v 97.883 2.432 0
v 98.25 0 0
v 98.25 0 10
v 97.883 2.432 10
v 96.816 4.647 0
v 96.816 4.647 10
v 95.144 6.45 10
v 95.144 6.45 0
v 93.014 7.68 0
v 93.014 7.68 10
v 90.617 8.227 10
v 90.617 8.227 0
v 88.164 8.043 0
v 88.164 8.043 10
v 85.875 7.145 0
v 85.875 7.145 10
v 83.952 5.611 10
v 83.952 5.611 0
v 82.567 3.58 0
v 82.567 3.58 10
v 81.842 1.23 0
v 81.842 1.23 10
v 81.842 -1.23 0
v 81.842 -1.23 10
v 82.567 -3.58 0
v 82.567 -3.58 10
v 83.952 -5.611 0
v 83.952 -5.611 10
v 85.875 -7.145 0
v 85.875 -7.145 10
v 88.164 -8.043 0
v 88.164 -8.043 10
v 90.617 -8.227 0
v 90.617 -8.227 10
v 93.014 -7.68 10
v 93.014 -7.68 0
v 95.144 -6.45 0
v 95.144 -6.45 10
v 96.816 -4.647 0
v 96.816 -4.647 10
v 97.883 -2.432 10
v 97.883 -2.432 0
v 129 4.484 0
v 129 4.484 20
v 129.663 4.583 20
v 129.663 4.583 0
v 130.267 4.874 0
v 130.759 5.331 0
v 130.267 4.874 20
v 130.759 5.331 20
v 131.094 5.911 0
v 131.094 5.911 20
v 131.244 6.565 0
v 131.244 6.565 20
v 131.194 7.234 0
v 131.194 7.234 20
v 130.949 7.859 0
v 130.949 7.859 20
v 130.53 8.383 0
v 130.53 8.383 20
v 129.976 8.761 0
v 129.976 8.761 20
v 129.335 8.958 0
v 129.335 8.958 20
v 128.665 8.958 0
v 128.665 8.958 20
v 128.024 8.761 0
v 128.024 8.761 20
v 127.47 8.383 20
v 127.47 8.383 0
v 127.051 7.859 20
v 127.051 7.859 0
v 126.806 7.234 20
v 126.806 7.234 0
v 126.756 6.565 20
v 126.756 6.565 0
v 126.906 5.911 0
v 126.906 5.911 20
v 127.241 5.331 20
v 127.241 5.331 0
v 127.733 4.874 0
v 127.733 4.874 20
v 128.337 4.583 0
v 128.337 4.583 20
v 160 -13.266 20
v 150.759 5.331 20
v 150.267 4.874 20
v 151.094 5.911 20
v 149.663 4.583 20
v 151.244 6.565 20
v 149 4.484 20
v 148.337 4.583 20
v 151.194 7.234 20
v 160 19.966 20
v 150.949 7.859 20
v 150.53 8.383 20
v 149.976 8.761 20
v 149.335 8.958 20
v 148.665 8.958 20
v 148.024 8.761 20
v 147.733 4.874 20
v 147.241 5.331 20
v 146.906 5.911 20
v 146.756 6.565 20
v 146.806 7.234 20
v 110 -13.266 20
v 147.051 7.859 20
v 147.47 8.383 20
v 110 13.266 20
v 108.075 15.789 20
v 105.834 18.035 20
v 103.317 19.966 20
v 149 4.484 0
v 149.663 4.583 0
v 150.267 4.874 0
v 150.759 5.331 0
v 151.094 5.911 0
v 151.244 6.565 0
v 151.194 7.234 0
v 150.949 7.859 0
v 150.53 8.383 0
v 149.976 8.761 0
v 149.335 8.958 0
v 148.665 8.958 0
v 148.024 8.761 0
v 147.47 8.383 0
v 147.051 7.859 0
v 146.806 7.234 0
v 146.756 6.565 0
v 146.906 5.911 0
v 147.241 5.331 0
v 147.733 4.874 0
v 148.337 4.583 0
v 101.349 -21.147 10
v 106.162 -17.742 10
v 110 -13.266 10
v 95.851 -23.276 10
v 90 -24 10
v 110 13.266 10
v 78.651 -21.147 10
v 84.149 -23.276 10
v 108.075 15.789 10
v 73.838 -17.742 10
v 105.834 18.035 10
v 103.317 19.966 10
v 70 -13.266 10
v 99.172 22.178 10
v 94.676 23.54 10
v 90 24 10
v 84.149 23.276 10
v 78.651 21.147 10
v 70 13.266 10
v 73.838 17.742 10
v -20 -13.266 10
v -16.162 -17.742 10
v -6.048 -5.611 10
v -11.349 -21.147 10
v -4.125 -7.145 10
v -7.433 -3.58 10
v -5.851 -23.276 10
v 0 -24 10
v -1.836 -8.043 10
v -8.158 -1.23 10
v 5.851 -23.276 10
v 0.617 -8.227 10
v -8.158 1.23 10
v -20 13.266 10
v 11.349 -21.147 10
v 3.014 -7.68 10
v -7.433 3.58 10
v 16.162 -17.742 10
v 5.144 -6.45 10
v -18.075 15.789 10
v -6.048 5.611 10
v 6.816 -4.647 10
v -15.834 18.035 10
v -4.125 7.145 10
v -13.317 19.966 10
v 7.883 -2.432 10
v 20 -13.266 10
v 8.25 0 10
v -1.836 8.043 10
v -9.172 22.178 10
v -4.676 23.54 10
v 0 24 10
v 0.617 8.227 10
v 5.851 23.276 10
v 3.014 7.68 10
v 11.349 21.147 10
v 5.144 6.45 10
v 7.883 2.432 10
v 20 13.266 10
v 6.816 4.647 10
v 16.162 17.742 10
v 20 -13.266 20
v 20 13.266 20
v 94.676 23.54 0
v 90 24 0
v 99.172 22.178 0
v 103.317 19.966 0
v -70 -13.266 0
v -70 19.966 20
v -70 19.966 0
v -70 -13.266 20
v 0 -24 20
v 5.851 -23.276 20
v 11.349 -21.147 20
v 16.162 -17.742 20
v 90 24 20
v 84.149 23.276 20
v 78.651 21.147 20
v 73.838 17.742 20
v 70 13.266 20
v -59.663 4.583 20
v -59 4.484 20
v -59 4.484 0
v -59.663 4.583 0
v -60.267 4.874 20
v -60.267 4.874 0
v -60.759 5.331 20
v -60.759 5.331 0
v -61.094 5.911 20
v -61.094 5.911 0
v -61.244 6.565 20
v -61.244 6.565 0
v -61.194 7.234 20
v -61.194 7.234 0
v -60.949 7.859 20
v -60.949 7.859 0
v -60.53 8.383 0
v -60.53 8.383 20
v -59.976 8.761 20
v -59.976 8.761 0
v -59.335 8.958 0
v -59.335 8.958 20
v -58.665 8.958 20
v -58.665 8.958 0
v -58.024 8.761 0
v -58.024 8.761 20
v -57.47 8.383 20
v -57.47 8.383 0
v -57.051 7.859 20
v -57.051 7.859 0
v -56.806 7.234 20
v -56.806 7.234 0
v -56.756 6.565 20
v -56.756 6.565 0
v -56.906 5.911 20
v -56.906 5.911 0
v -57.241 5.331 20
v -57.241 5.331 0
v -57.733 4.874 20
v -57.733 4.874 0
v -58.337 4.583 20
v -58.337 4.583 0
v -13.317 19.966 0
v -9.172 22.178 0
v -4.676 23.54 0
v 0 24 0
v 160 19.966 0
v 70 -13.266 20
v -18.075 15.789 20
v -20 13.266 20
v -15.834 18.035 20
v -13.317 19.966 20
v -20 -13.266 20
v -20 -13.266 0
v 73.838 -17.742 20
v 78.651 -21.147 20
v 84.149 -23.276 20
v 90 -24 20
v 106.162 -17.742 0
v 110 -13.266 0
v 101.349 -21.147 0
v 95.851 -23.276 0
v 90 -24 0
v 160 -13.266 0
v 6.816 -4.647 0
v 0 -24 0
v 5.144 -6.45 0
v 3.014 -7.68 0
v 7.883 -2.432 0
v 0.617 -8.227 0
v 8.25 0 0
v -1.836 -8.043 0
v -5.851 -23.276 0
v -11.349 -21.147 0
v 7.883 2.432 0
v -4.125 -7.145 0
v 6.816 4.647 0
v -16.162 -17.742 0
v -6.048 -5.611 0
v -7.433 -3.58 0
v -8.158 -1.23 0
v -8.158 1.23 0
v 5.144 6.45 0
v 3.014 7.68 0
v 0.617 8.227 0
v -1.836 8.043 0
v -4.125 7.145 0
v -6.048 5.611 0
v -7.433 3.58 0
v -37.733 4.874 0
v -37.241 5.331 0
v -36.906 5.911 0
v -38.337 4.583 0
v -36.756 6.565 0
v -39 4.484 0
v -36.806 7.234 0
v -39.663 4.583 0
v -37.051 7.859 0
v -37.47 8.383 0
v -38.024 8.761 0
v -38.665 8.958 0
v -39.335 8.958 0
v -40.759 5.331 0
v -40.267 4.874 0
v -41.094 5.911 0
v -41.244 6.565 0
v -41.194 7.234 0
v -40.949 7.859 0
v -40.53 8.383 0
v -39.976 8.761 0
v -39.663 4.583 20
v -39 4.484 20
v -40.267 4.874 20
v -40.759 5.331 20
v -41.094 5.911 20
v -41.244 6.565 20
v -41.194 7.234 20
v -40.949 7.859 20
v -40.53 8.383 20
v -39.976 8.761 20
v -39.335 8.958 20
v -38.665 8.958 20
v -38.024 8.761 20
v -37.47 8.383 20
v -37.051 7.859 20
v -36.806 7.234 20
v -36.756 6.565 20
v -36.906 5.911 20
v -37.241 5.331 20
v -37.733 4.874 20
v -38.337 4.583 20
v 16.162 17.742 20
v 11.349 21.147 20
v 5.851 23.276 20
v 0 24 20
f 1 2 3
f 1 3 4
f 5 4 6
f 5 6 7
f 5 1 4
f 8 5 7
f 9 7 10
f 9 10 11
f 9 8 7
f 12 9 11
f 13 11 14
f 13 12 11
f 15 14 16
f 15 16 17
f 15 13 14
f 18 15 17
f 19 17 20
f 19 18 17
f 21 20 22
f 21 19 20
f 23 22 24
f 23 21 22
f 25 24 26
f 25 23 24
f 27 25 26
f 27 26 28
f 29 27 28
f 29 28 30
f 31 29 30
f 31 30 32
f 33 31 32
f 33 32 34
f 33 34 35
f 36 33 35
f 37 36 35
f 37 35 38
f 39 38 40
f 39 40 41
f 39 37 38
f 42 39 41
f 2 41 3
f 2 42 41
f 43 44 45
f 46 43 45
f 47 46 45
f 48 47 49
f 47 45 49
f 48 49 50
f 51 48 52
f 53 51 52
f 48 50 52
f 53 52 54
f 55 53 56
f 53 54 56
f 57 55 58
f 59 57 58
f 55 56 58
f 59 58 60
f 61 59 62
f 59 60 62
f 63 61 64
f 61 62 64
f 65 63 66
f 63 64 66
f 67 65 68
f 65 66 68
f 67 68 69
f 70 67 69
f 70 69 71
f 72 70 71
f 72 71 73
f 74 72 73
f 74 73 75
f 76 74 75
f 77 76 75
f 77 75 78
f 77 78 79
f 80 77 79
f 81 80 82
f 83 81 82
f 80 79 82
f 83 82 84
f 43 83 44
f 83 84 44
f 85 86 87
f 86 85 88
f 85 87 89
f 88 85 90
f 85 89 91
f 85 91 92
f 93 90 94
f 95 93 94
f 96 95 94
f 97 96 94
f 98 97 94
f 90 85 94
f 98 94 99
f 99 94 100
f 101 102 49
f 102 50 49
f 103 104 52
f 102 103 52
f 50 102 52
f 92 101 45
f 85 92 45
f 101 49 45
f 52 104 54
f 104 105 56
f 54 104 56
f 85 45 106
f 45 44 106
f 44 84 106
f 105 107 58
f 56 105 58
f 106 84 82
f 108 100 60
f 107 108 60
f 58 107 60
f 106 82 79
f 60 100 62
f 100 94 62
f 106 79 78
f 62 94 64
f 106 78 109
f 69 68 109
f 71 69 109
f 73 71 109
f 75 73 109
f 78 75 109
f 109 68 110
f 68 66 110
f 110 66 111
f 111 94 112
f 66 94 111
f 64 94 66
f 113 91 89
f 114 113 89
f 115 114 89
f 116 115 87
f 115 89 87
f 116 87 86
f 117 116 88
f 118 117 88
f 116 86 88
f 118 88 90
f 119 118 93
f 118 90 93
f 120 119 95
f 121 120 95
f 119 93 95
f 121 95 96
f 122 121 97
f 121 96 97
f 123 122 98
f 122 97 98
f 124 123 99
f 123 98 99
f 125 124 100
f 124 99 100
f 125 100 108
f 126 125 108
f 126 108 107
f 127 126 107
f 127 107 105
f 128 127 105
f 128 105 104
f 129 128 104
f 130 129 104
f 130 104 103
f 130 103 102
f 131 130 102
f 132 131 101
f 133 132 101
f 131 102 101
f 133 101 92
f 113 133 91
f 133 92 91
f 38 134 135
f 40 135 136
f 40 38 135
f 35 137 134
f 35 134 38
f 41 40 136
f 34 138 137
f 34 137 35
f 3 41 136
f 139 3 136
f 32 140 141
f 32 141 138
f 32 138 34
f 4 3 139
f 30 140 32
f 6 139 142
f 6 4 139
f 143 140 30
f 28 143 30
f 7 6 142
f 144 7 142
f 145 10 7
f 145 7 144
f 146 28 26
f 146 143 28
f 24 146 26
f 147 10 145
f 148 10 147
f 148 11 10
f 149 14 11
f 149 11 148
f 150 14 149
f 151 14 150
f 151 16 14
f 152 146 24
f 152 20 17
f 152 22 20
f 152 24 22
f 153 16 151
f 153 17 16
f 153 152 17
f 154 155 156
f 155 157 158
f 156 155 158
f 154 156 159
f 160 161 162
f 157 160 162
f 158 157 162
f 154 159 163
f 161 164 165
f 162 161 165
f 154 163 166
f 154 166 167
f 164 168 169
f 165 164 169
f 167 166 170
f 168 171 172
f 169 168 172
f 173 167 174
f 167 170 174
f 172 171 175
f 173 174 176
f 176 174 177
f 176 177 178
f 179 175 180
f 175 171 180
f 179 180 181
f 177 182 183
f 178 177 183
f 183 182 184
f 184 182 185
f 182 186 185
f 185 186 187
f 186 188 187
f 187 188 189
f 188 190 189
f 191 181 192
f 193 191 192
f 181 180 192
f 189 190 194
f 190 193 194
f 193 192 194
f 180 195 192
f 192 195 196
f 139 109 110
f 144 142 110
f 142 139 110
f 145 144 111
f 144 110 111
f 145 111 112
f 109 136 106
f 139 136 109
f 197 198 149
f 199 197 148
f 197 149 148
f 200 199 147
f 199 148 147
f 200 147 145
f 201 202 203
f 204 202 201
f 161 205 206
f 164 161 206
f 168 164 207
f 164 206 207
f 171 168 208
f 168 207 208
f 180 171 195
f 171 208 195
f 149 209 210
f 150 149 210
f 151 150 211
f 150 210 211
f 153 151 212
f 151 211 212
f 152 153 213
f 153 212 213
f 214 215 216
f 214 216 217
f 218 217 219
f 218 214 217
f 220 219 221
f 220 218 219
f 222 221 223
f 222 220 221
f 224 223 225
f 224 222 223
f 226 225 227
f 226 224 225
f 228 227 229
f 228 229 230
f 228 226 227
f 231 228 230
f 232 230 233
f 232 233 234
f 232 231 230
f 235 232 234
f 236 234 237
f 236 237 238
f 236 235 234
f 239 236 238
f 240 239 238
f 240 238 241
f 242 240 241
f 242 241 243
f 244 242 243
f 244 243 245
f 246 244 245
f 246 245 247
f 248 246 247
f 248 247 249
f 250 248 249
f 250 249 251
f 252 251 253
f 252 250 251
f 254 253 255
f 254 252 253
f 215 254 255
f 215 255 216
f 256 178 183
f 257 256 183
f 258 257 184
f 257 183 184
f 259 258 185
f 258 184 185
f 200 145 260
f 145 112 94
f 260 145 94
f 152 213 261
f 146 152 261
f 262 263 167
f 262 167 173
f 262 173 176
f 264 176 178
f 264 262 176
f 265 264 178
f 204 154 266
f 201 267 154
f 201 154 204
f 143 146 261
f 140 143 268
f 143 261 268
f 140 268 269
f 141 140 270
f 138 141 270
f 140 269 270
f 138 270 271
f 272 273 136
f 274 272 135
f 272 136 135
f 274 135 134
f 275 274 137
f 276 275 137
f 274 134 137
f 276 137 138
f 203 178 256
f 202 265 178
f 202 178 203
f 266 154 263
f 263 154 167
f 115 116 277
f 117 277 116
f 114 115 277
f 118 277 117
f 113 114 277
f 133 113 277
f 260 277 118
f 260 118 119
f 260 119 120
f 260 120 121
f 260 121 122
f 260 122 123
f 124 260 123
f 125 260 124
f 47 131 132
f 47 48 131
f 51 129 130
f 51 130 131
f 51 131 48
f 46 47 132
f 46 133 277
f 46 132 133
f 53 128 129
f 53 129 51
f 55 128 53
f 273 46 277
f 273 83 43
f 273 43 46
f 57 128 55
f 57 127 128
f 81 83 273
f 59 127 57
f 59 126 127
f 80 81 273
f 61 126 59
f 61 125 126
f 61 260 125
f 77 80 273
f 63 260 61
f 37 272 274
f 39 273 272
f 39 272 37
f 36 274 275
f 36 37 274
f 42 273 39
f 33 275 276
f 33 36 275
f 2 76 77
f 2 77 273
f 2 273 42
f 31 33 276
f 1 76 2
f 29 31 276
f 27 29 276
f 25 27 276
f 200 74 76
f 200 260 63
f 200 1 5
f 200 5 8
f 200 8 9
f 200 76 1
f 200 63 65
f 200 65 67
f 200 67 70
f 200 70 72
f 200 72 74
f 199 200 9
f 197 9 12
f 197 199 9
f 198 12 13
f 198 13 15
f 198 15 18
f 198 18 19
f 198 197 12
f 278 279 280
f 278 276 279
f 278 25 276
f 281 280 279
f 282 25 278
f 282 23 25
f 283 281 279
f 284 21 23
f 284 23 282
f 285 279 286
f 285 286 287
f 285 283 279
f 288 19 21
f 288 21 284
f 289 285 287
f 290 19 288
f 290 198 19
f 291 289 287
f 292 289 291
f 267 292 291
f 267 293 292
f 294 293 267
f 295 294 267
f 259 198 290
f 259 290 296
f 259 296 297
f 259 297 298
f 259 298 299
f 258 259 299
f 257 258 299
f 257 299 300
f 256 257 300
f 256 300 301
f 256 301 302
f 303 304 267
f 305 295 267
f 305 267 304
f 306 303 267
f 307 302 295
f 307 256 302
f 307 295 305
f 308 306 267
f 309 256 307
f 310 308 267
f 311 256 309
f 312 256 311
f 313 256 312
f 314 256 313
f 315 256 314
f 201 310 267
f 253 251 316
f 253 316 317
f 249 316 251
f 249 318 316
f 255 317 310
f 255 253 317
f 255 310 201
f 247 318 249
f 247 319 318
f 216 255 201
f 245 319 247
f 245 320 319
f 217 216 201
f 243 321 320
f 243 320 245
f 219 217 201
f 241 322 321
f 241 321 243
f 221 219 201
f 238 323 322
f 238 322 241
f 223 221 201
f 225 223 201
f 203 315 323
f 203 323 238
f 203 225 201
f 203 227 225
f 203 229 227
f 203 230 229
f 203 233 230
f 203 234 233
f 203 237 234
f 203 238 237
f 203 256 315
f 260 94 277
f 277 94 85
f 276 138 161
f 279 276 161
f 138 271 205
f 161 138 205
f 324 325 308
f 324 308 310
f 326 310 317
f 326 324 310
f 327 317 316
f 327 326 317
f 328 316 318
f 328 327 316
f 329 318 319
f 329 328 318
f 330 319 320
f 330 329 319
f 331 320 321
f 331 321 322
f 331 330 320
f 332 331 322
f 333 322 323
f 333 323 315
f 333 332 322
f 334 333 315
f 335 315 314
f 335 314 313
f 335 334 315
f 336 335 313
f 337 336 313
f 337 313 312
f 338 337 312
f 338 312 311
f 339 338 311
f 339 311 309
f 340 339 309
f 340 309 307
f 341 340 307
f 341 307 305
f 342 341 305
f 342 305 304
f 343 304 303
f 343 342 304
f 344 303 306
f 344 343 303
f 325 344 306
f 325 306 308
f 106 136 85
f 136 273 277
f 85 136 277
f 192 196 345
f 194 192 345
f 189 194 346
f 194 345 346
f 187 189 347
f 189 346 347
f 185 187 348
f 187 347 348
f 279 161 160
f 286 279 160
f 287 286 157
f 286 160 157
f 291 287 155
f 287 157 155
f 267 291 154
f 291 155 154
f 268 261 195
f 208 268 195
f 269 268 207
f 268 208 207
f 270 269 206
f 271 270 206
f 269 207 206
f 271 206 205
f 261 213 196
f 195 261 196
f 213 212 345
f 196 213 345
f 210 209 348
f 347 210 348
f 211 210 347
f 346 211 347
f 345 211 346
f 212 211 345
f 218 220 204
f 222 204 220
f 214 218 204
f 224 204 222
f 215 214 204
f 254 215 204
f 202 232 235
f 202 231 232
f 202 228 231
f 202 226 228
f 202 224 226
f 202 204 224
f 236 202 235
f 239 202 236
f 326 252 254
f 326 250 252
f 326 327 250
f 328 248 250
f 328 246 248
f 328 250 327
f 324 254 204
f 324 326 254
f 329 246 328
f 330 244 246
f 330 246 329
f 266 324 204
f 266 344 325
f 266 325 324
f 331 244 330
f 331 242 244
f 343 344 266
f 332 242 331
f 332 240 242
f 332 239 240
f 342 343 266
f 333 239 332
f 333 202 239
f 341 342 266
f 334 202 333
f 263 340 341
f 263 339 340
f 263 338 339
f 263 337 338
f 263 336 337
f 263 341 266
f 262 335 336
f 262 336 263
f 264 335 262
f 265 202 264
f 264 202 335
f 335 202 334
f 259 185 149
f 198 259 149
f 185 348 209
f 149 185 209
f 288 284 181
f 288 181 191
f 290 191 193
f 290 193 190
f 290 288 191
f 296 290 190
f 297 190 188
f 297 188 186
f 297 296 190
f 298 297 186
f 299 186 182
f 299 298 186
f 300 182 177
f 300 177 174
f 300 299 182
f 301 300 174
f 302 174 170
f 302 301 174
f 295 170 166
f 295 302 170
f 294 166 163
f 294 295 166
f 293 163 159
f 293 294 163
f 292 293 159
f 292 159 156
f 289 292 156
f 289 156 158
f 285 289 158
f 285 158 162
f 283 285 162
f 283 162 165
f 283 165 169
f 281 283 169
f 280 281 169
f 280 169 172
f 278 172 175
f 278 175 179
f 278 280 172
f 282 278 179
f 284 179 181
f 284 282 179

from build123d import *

# Parameters (mm, degrees)
SKETCH_1_W                  = 130
SKETCH_1_H                  = 48
SKETCH_1_R                  = 8.25
EXTRUDE_1_DEPTH             = 10
CUT_EXTRUDE_1_DEPTH         = 10
EXTRUDE_START               = 10
EXTRUDE_2_DEPTH             = 10
SKETCH_6_W                  = 10
SKETCH_6_H                  = 26.532998322
EXTRUDE_3_DEPTH             = 50
SKETCH_7_W                  = 50
SKETCH_7_H                  = 26.532998322
EXTRUDE_4_DEPTH             = 10
HOLE_WIZARD_M4_1_AT_2_COUNT = 2
HOLE_WIZARD_M4_1_AT_2_PITCH = 20
EXTRUDE_6_DEPTH             = 20


with BuildPart() as part:
    # 스케치1 → 보스-돌출1 (new body)
    with BuildSketch(Plane.XY):
        with Locations((45, 0)):
            Rectangle(SKETCH_1_W, SKETCH_1_H)
        Circle(SKETCH_1_R, mode=Mode.SUBTRACT)
        with Locations((90, 0)):
            Circle(SKETCH_1_R, mode=Mode.SUBTRACT)
    extrude(amount=EXTRUDE_1_DEPTH)

    # 스케치4 → 컷-돌출1 (cut)
    with BuildSketch(Plane.XY.offset(10)):
        with BuildLine():
            Line((-20, 24), (-20, 13.266499161))
            ThreePointArc((-20, 13.266499161), (-11.349097324, 21.147056295), (0, 24))
            Line((0, 24), (-20, 24))
        make_face()
        with BuildLine():
            ThreePointArc((0, -24), (-11.349097324, -21.147056295), (-20, -13.266499161))
            Line((-20, -13.266499161), (-20, -24))
            Line((-20, -24), (0, -24))
        make_face()
        with BuildLine():
            ThreePointArc((110, -13.266499161), (101.349097324, -21.147056295), (90, -24))
            Line((90, -24), (110, -24))
            Line((110, -24), (110, -13.266499161))
        make_face()
        with BuildLine():
            Line((110, 24), (90, 24))
            ThreePointArc((90, 24), (101.349097324, 21.147056295), (110, 13.266499161))
            Line((110, 13.266499161), (110, 24))
        make_face()
    extrude(amount=-CUT_EXTRUDE_1_DEPTH, mode=Mode.SUBTRACT)

    # 스케치5 → 보스-돌출2 (add)
    with BuildSketch(Plane.XY.offset(10).offset(EXTRUDE_START)):
        with BuildLine():
            Line((20, -13.266499161), (20, 13.266499161))
            ThreePointArc((20, 13.266499161), (11.349097324, 21.147056295), (0, 24))
            Line((0, 24), (90, 24))
            ThreePointArc((90, 24), (78.650902676, 21.147056295), (70, 13.266499161))
            Line((70, 13.266499161), (70, -13.266499161))
            ThreePointArc((70, -13.266499161), (78.650902676, -21.147056295), (90, -24))
            Line((90, -24), (0, -24))
            ThreePointArc((0, -24), (11.349097324, -21.147056295), (20, -13.266499161))
        make_face()
    extrude(amount=-EXTRUDE_2_DEPTH)

    # 스케치6 → 보스-돌출3 (add)
    with BuildSketch(Plane(origin=(110, 0, 0), x_dir=(0, 0, -1), z_dir=(1, 0, 0))):
        with Locations((-5, 0)):
            Rectangle(SKETCH_6_W, SKETCH_6_H)
    extrude_3 = extrude(amount=EXTRUDE_3_DEPTH)

    # 스케치7 → 보스-돌출4 (add)
    with BuildSketch(Plane.XY.offset(10)):
        with Locations((135, 0)):
            Rectangle(SKETCH_7_W, SKETCH_7_H)
    extrude_4 = extrude(amount=EXTRUDE_4_DEPTH)

    # 대칭 복사2: 보스-돌출3, 보스-돌출4 across plane
    add(extrude_3.mirror(Plane.ZY.offset(-45)))
    add(extrude_4.mirror(Plane.ZY.offset(-45)))

    # 스케치11 → M4 남비 머리 나사용 카운터보어1 (revolve, cut)
    with BuildSketch(Plane(origin=(-59, 6.733500839, 30), x_dir=(0, -1, 0), z_dir=(1, 0, 0))):
        Polygon((0, 0), (0, 31.351936393), (2.25, 30), (2.25, 3.1), (4.5, 3.1), (4.5, 0), align=None)
    hole_wizard_m4_1 = revolve(axis=Axis((-59, 6.733500839, 36.35), (0, 0, -1)), mode=Mode.SUBTRACT)

    # M4 남비 머리 나사용 카운터보어1 at 2: M4 남비 머리 나사용 카운터보어1 ×2
    with Locations(*[(i * HOLE_WIZARD_M4_1_AT_2_PITCH, 0, 0) for i in range(1, HOLE_WIZARD_M4_1_AT_2_COUNT)]):
        add(hole_wizard_m4_1, mode=Mode.SUBTRACT)

    # 스케치14 → 보스-돌출6 (add, through all)
    with BuildSketch(Plane.XY.offset(20)):
        with BuildLine():
            ThreePointArc((-20, 13.266499161), (-16.991935867, 16.949162679), (-13.316865669, 19.966499161))
            Line((-13.316865669, 19.966499161), (-70, 19.966499161))
            Line((-70, 19.966499161), (-70, 13.266499161))
            Line((-70, 13.266499161), (-20, 13.266499161))
        make_face()
    extrude_6 = extrude(amount=-EXTRUDE_6_DEPTH)

    # 대칭 복사3: M4 남비 머리 나사용 카운터보어1, 보스-돌출6 across plane
    add(hole_wizard_m4_1.mirror(Plane.ZY.offset(-45)), mode=Mode.SUBTRACT)
    add(extrude_6.mirror(Plane.ZY.offset(-45)))

    # 대칭 복사3 copy 1 sketch → 대칭 복사3 copy 1 (revolve, cut)
    with BuildSketch(Plane(origin=(129, 6.733500839, 30), x_dir=(0, -1, 0), z_dir=(-1, 0, 0))):
        Polygon((0, 0), (0, -31.351936393), (2.25, -30), (2.25, -3.1), (4.5, -3.1), (4.5, 0), align=None)
    revolve(axis=Axis((129, 6.733500839, 36.35), (0, 0, 1)), mode=Mode.SUBTRACT)


solid = part.part
